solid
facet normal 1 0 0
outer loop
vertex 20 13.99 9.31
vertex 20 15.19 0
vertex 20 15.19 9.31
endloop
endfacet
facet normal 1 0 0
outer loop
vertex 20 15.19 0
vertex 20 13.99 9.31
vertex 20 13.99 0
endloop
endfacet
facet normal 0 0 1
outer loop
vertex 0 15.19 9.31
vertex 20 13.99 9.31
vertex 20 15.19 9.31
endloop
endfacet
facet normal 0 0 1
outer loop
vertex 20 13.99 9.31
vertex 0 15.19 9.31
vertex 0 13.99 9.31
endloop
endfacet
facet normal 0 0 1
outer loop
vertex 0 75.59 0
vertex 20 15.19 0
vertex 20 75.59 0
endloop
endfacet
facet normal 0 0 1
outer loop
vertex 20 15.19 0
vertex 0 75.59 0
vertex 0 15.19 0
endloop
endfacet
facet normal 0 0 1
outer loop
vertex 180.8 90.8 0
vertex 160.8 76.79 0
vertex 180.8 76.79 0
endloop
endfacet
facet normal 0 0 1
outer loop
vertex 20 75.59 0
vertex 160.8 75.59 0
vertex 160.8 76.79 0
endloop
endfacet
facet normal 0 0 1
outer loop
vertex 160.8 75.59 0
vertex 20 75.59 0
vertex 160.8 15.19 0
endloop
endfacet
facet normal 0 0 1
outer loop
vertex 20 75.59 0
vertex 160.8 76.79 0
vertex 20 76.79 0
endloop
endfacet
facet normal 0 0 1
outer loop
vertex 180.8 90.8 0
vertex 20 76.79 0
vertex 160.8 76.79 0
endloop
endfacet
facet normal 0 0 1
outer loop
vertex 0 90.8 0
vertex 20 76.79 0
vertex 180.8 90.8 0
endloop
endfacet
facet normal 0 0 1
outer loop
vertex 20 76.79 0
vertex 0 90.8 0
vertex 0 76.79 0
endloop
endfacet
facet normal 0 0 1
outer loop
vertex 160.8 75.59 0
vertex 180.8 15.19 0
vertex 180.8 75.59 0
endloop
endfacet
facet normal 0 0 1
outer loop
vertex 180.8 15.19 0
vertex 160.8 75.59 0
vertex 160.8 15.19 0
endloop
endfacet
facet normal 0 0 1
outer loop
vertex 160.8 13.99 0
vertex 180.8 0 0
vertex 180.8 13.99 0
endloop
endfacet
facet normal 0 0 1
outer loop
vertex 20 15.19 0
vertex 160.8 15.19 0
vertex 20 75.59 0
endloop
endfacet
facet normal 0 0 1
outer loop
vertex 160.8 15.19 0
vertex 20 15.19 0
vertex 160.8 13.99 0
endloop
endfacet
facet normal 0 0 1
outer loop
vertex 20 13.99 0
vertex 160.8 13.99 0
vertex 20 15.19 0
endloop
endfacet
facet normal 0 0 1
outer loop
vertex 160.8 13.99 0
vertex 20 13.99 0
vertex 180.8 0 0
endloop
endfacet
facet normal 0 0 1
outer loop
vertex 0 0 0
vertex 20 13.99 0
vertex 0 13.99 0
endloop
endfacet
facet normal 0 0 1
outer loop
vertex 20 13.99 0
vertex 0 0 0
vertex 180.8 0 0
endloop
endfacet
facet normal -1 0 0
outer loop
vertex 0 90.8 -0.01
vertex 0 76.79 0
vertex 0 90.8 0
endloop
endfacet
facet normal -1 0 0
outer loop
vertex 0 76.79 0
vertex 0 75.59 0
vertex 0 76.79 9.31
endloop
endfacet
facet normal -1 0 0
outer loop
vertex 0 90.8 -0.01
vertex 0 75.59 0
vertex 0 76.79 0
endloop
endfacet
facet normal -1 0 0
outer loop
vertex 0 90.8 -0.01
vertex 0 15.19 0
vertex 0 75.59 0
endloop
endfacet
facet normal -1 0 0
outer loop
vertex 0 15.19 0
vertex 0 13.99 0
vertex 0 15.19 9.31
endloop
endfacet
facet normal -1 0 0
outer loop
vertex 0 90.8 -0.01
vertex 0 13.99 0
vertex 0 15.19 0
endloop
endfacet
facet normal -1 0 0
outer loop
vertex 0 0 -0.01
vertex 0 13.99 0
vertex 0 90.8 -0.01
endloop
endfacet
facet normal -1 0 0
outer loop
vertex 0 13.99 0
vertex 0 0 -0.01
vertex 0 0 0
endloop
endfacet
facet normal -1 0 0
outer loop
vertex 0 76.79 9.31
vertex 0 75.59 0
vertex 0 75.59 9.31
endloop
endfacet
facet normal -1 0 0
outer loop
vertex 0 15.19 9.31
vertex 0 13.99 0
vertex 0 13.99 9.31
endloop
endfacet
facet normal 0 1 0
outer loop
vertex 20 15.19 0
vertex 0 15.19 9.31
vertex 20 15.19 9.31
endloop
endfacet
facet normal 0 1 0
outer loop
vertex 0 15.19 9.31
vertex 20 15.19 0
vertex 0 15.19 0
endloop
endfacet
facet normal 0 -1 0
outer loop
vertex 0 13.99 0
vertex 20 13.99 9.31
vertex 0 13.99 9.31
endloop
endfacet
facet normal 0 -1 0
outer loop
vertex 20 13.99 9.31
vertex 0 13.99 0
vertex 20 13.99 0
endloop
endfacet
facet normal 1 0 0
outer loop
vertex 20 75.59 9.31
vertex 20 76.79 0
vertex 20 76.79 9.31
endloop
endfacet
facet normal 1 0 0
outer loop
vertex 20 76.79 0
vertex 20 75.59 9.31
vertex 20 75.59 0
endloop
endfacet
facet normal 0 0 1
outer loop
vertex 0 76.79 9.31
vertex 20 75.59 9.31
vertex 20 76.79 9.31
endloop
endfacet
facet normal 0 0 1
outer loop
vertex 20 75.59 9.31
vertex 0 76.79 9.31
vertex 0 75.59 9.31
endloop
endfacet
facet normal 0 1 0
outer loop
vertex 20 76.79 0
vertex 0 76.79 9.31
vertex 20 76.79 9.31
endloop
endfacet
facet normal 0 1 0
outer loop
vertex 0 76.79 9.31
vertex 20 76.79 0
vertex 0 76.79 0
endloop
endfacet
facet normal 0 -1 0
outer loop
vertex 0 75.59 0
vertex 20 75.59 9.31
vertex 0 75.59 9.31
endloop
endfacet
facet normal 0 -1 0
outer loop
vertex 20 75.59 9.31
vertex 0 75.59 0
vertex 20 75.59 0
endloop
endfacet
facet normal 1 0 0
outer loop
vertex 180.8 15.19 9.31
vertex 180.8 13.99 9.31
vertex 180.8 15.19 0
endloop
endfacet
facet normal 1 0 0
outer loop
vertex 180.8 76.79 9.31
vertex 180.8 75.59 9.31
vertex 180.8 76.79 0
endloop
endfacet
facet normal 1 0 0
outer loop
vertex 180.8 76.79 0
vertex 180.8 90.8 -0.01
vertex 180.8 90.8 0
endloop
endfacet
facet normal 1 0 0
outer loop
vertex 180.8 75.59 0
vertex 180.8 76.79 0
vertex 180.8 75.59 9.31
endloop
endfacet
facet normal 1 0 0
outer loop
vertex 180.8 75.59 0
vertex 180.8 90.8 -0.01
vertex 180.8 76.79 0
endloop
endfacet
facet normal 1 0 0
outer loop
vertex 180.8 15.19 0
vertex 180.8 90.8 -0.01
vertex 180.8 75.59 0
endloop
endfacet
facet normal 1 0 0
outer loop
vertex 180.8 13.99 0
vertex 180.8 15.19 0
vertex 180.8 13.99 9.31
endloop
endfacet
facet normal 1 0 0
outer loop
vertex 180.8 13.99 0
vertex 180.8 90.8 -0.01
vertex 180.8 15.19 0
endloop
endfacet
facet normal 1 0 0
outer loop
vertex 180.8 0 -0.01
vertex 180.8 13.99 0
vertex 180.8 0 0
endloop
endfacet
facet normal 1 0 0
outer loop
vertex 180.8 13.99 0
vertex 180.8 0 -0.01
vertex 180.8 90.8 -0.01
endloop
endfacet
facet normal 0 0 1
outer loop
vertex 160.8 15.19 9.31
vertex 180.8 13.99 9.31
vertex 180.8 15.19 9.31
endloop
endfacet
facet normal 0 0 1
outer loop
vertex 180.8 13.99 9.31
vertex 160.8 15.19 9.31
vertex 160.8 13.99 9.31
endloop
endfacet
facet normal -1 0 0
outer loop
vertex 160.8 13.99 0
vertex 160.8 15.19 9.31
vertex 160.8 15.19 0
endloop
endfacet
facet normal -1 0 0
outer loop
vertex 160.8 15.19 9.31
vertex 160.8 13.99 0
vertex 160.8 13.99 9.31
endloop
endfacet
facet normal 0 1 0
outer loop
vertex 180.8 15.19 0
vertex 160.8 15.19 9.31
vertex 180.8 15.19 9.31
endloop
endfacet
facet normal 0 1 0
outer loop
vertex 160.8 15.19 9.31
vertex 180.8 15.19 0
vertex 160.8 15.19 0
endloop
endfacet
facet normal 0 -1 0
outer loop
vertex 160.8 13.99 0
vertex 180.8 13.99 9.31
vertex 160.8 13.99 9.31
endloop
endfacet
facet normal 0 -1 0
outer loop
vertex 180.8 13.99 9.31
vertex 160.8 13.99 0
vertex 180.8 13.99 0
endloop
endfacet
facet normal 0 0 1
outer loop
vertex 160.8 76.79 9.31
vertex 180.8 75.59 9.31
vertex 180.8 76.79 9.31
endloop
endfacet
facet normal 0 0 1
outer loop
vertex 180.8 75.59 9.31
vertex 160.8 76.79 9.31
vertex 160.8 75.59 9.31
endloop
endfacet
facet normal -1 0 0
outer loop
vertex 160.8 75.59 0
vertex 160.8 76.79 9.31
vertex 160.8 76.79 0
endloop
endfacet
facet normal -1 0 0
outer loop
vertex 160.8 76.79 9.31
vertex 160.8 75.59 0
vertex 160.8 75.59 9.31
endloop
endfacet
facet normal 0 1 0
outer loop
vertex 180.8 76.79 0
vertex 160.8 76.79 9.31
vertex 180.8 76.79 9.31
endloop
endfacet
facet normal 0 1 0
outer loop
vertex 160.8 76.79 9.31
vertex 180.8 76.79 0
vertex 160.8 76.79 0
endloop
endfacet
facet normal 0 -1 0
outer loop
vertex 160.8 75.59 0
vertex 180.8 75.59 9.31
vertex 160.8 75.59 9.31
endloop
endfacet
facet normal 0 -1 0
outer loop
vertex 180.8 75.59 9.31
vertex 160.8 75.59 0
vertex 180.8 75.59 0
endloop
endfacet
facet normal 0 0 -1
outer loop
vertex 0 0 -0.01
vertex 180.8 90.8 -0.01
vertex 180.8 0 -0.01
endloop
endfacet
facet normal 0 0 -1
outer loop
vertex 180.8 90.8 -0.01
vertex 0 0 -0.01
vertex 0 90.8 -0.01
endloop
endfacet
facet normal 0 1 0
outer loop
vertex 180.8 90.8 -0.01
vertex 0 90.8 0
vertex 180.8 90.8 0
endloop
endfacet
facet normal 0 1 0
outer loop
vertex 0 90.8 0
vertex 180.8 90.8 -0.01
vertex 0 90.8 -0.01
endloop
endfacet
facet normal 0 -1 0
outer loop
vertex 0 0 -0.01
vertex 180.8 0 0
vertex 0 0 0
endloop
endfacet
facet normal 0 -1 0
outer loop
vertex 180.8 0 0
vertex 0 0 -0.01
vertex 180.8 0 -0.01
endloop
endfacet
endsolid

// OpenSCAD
// file: ../Base/Boxes.scad
// Fischertechnik Box Foundation
// Pre-designed Boxes

use <Constants.scad>

include <PlacementOptions.scad>

box190Width = 190;
box190Depth = 130;
box130Width = 130;
box130Depth = 95;

// Values are from an original ec3 box
topBottomDifference = 1.5;
outerHeight = 40;
baseThickness = 1.8;
innerHeight = outerHeight - baseThickness;
stackExcess = 5.7;
radius = 3.5;
wallThickness = 1.5;
tolerance = 0.2;

boxWallThickness = wallThickness;
boxBaseThickness = baseThickness;
boxWebWidth = 3.0;

// getBoxWallThickness()
// Gets the wall thickness of a Fischertechnik Box
function getBoxWallThickness() = boxWallThickness;

// getBoxUsageHeight(height = 38.2)
// Gets the usable height of a Fischertechnik box
// height = Outer height of the box from the bottom to the upper edge.
function getBoxUsageHeight(height = outerHeight) = height - baseThickness - stackExcess;

// getBoxInnerHeight()
// Gets the inner height of a Fischertechnik box, including the stack excess
function getBoxInnerHeight() = innerHeight;

// getBoxBaseThickness()
// Gets the thickness of the Fischertechnik box base.
function getBoxBaseThickness() = boxBaseThickness;

// getBoxWebWidth()
// Gets the width of a box web
function getBoxWebWidth() = boxWebWidth;

// getBox190Space()
// Gets the usable inner space of a Box 190 as an x/y-list
function getBox190Space() = [
    box190Width - 2*getBoxWallThickness() - topBottomDifference, 
    box190Depth - 2*getBoxWallThickness() - topBottomDifference ];

// RoundedCornerPlate(width, depth, height, radius)
// Creates a body plate with rounded corners for a box. Used
// also to create the complete box with the hull module.
// width = Width of the plate
// depth = depth of the plate 
// height = thickness of the plate
// radius = radius of the rounded corner
module RoundedCornerPlate(width, depth, height, radius) {
    translate([radius, radius])
    hull() {
        w = width-2*radius;
        d = depth-2*radius;
        cube([w, d, height]);
        cylinder(height, r=radius, $fn=getFragments());
        translate([w, 0])
            cylinder(height, r=radius, $fn=getFragments());
        translate([w, d])
            cylinder(height, r=radius, $fn=getFragments());
        translate([0, d])
            cylinder(height, r=radius, $fn=getFragments());
    }
}

// BoxBase(width, depth)
// Creates an empty stackable Fischertechnik compatible box
// width = Outer width of the box (190, 130, ...)
// depth = Outer depth of the box (130, 95, ...)

module BoxBase(width, depth, height=outerHeight) {    
    thinPlate = 0.01;

    innerHeight = height - baseThickness;    
    
    module Body(tolerance=tolerance) {
        hull() {
            // Bottom with tolerance to fit into the original boxes when stacked
            translate([-wallThickness+tolerance, -wallThickness+tolerance, -baseThickness])
                RoundedCornerPlate(width-topBottomDifference-2*tolerance, depth-topBottomDifference-2*tolerance, thinPlate, radius);
            
            // Top
            translate([-wallThickness-topBottomDifference/2, -wallThickness-topBottomDifference/2, innerHeight-thinPlate])
                RoundedCornerPlate(width, depth, thinPlate, radius);
         }
    }

    module Cutoff() {
        hull() {
            coWidth = width - 2*wallThickness;
            coDepth = depth - 2*wallThickness;
            
            // Bottom
            RoundedCornerPlate(coWidth-topBottomDifference, coDepth-topBottomDifference, thinPlate, radius);

            // Top
            translate([-topBottomDifference/2, -topBottomDifference/2, innerHeight+thinPlate]) 
                RoundedCornerPlate(coWidth, coDepth, thinPlate, radius);
        }
    }
    
    difference() {        
        Body();
        Cutoff();
        stackOffset = innerHeight - stackExcess;
        translate([0, 0, stackOffset + baseThickness])
            Body(tolerance=0);
    }
}

// Creates the Fischertechnik empty box 130x190 mm and places it at position 0,0
// 190x130 are the outer sizes, the inner space is slightly smaller. Use getBox190Space() to get the inner sizes.
// The box is positioned that the usable inner space is at the 0,0,0 position.

module Box190() {
    BoxBase(box190Width, box190Depth);
}

// Gets the usable inner space of a Box 130 as an x/y-list
function getBox130Space() = [
    box130Width - 2*getBoxWallThickness() - topBottomDifference, 
    box130Depth - 2*getBoxWallThickness() - topBottomDifference ];

// Creates the Fischertechnik empty box 95x130 mm and places it at position 0,0
// 190x130 are the outer sizes, the inner space is slightly smaller. Use getBox190Space() to get the inner sizes.
// The box is positioned that the usable inner space is at the 0,0,0 position.

module Box130() {
    BoxBase(box130Width, box130Depth);
}

// Creates a web at the specified box walls
// corner 0 = LowerLeft, 1 = UpperLeft, 2 = UpperRight, 3 = LowerRight
// side 0 = LeftOfCorner, 1 = RightOfCorner
// distance = Distance in mm from the corner
// boxSpace = inner width and depth of the box (default: Box 190)
// webWidth = length of the web (default is 3 mms)
// webThickness = thickness of the web (default is 1 mm)
// height = Height of the web (standard is getBoxUsageHeight())
// sink = How much of the web is sunk into the wall

module BoxWeb(
    corner, 
    side, 
    distance, 
    boxSpace=getBox190Space(), 
    webWidth=getBoxWebWidth(), 
    webThickness=1.0, 
    height=getBoxUsageHeight(),
    sink = getBoxWallThickness()/2) {
    width = (corner % 2 == 0) ? 
            (side == LeftOfCorner ? webWidth : webThickness) :
            (side == LeftOfCorner ? webThickness : webWidth);

    depth = (corner % 2 == 0) ? 
            (side == RightOfCorner ? webWidth : webThickness) :
            (side == RightOfCorner ? webThickness : webWidth);
    
    xDiff = corner == LowerLeft ? 
                (side == LeftOfCorner ? -sink : distance) :
            (corner == UpperLeft ?                
                (side == LeftOfCorner ? distance : -sink) :
            (corner == UpperRight ?
                (side == LeftOfCorner ? boxSpace.x-webWidth+sink : boxSpace.x-distance-webThickness) :
                (side == LeftOfCorner ? boxSpace.x-distance-webThickness: boxSpace.x-webWidth+sink)));

    yDiff = corner == LowerLeft ? 
                (side == RightOfCorner ? -sink : distance) :
            (corner == UpperLeft ?
                (side == RightOfCorner ? boxSpace.y-distance-webThickness : boxSpace.y-webWidth+sink) :
            (corner == UpperRight ?
                (side == RightOfCorner ? boxSpace.y-webWidth+sink : boxSpace.y-distance-webThickness) :
                (side == RightOfCorner ? distance : -sink)));
    
    translate([xDiff, yDiff, -getExcess()])
        cube([width, depth, height + 2*getExcess()]);
}
// file: ../Base/Rotation.scad
// Fischertechnik Box Foundation
// Geometry Helpers Rotation

include <PlacementOptions.scad>

// getRotatedSpace(space, rotation=NoRotation)
// Rotates the space dependent on the specified rotation

function getRotatedSpace(space, rotation=NoRotation) = [
    (rotation == Rotate90 || rotation == Rotate270) ? space.y : space.x,
    (rotation == Rotate90 || rotation == Rotate270) ? space.x : space.y
];

// Rotates the given space around the fixed left lower corner
// space = the space the children needs as width/depth list [width,depth]
// rotation = 0 Rotate0 degrees, 1 Rotate90 degrees, 2 Rotate180 degrees, 3 Rotate270 degrees (equivalent to -90)

module RotateFix(space, rotation=NoRotation) {
    dy = (rotation == Rotate0 || rotation == Rotate270) ? 0 :
        (rotation == Rotate90) ? space.x :
        space.y;
    dx = (rotation < Rotate180) ? 0 :
        (rotation == Rotate180) ? space.x :
        space.y;
    
    translate([dx, dy, 0])
        rotate([0, 0, rotations[rotation]])
            children();
}
// file: ../Base/Alignment.scad
// Fischertechnik Box Foundation
// Geometry Helpers Alignment

include <PlacementOptions.scad>

// getAlignedX(elementWidth, spaceWidth, align=AlignRight, offset=0)
// Gets the aligned X offset of an element with the given
// width in the given space.
// elementWidth = The width of the element to positon
// spaceWidth = The space where the element should be aligned
// align = 0 AlignLeft, 1 AlignCenter, 2 AlignRight
// offset = an optional offset from the aligned position. When
// aligned left or centered, then positive values are in X direction.
// When aligned right then positive values are in negative X direction.

function getAlignedX(elementWidth, spaceWidth, align=AlignRight, offset=0) =
    (align == AlignLeft) ?
        offset :
        ((align == AlignCenter) ?
        (spaceWidth - elementWidth)/2 + offset :
        spaceWidth - offset - elementWidth);

// getAlignedY(elementDepth, spaceDepth, align=AlignTop, offset=0)
// Gets the aligned Y offset of an element with the given
// depth in the given space.
// elementDepth = The depth of the element to positon
// spaceDepth = The space where the element should be aligned
// align = 0 AlignBottom, 1 AlignCenter, 2 AlignTop
// offset = an optional offset from the aligned position. When
// aligned bottom or centered, then positive values are in Y direction.
// When aligned top then positive values are in negative Y direction.

function getAlignedY(elementDepth, spaceDepth, align=AlignTop, offset=0) =
    (align == AlignBottom) ?
        offset :
        ((align == AlignCenter) ?
        (spaceDepth - elementDepth)/2 + offset :
        spaceDepth - offset - elementDepth);
// file: ../Base/PlacementOptions.scad
// Fischertechnik Box Foundation
// Placement Options

// Alignment
NoAlign = 0;
AlignLeft = 1;
AlignBottom = 2;
AlignCenter = 3;
AlignRight = 4;
AlignTop = 5;

// Element rotation degree steps
rotations = [0, -90, -180, -270];

// Rotation
NoRotation = 0;
Rotate0 = 0;
Rotate90 = 1;
Rotate180 = 2;
Rotate270 = 3;

// Docking (seen from above)
NoDock = -1;
DockLeft = 0;
DockTop = 1;
DockRight = 2;
DockCorner = 2;
DockBottom = 3;

// Web corners
LowerLeft = 0;
UpperLeft = 1;
UpperRight = 2;
LowerRight = 3;

// Web position relative to corner
LeftOfCorner = 0;
RightOfCorner = 1;
// file: ../Base/Placement.scad
// Fischertechnik Box Foundation
// Geometry Helpers Placement

use <Constants.scad>
use <Alignment.scad>
use <Rotation.scad>
use <Boxes.scad>

include <PlacementOptions.scad>

// Place(x=0, y=0, elementSpace=[0,0], alignX=AlignLeft, alignY=AlignBottom, rotation=Rotate0, boxSpace=getBox190Space())
// Places the child at the specified position
// y = Y-Position. This is a relative position when an X aligment is specified.
// x = X-Position. This is a relative position when an Y aligment is specified.
// elementSpace = space of the element to be placed [x,y]
// alignX = -1=NoAlign, 0 AlignLeft, 1 AlignCenter, 3 AlignRight (elementSpace and boxSpace required!)
// alignY = -1=NoAlign, 2 AlignBottom, 1 AlignCenter, 4 AlignTop (elementSpace and boxSpace required!)
// rotation = 0 Rotate0 0 degrees, 1 Rotate90 90 degrees, 
// 2 Rotate180 180 degrees, 3 Rotate270 270 degrees (equivalent to -90)
// boxSpace = Inner space of the box where the placement occurs [x,y] - default is Box 190x130 inner space

module Place(x=0, y=0, elementSpace=[0,0], 
  alignX=AlignLeft, alignY=AlignBottom, 
  rotation=NoRotation, boxSpace=getBox190Space()) {

    module Position(x, y, space, rotation=Rotate0) {
        translate([x, y, 0])
            RotateFix(space, rotation)
                children();
    }

    space = getRotatedSpace(elementSpace, rotation);
    alignedX = getAlignedX(space.x, boxSpace.x, alignX, x);
    alignedY = getAlignedY(space.y, boxSpace.y, alignY, y);
    Position(alignedX, alignedY, elementSpace, rotation)
        children();
}

// Center(space=getBox130Space(), elementSpace=[0,0])
// space = Space where the children is centered. For cylinder use centered=true and no elementSpace.
// elementSpace = space of the element to be centered [x,y]

module Center(space=getBox190Space(), elementSpace=[0,0]) {
    Place(elementSpace=elementSpace, boxSpace=space, alignX=AlignCenter, alignY=AlignCenter)
        children();
}

// CenterHorizontal(width=0, y=0, offset=0, space=getBox130Space())
// width = Width of the element to be placed.
// y = Y position of the element
// offset = Offset from the center position (negative will be left of the center)
// space = Space where the element is placed

module CenterHorizontal(width=0, y=0, offset=0, space=getBox190Space()) {
    Place(x=offset, y=y, elementSpace=[width, 0], boxSpace=space, alignX=AlignCenter)
        children(0);
}

// CenterVertical(depth=0, x=0, offset=0, space=getBox130Space())
// depth = Depth of the element to be placed.
// x = X position of the element
// offset = Offset from the center position (negative will be down of the center)
// space = Space where the element is placed

module CenterVertical(depth=0, x=0, offset=0, space=getBox190Space()) {
    Place(x=x, y=offset, elementSpace=[0, depth], boxSpace=space, alignY=AlignCenter)
        children(0);
}

// getIsVertical(align)
// True if the specified alignment needs a vertical orientation for a divider (AlignRight, AlignLeft)

function getIsVertical(align) = (align == AlignRight || align == AlignLeft);

// getIsHorizontal(align)
// True if the specified alignment needs a horizontal orientation for a divider (AlignTop, AlignBottom)

function getIsHorizontal(align) = (align == AlignTop || align == AlignBottom);
// file: ../Base/Constants.scad
// Fischertechnik Box Foundation
// Constants

// Constant values necessary for multiple elements

// Base constants
dividerThickness = 1.2;
excess = 0.01;
fragments = 90;
tolerance = 0.8;

// Gets the thickness of a divider 
function getDividerThickness() = dividerThickness;

// Gets the excess that is used to merge walls into each other
function getExcess() = excess;

// Gets amount of fragments of a cylinder
function getFragments() = fragments;

// Gets the inner tolerance of a frame to each side
function getTolerance() = tolerance;


// Fischertechnik specific constants
axisDiameter = 4;
axisBottomDiameter = axisDiameter + 1;
axisTolerance = 0.2;

// Gets axis diameter of Fischertechnik axis
function getAxisDiameter() = axisDiameter;

// Gets axis diameter tolerance (subtracted for element axis)
function getAxisTolerance() = axisTolerance;

// Gets the axis diameter for standing axis
function getStandAxisDiameter() = getAxisDiameter() - getAxisTolerance();

// Gets axis bottom diameter for thicker part at the bottom
function getAxisBottomDiameter() = axisBottomDiameter;

pinHeight = 2.5;

// gets the height of a connecting pin
function getPinHeight() = pinHeight;

standardEdgeDistance = 2.5;
standardWebDistance = 11.5;
standardCornerLength = 15;

// gets the standard distance to the wall of the box for dockable frames with webs
function getStandardEdgeDistance() = standardEdgeDistance;

// gets the standard distance of each web to the corner of the dockable frame
function getStandardWebDistance() = standardWebDistance;

// gets the standard length of the corner walls of a dockable frame
function getStandardCornerLength() = standardCornerLength;

tubeWallFactor = 0.8;

// gets the wall thickness of a tube.
function getTubeWallThickness() = tubeWallFactor * getDividerThickness();

smallPartsFrameHeight = 20;

// gets the frame height for docked small parts boxes.
function getSmallPartsFrameHeight() = smallPartsFrameHeight;

hubRingDiameter = 19.5;
hubRingLevelDiameter = 21;

// gets the diameter of a tube matching the inner ring of a wheel
function getHubRingDiameter() = hubRingDiameter;

// gets the diameter of a hub tube with a thicker diameter
function getHubRingLevelDiameter() = hubRingLevelDiameter;
// main file
// Fischertechnik Box Library
// Base Plate 180 x 90
// 31001

use <../ModelBase/Complex.scad>

/* [Hidden] */
width = 180;
depth = 90;

// getRailsBasePlate180x90Space()
// Gets the width and depth of the space the rails base for the base plate 180x90 needs.
function getRailsBasePlate180x90Space() = getRailsBasePlateVolume(width, depth);

// RailsBasePlate180x90()
// Rails for a base plate of 180 x 90 mm
// 31001

module RailsBasePlate180x90() {
    RailsBasePlate(width, depth);
}

// Test
color("lightgray")
RailsBasePlate180x90();
